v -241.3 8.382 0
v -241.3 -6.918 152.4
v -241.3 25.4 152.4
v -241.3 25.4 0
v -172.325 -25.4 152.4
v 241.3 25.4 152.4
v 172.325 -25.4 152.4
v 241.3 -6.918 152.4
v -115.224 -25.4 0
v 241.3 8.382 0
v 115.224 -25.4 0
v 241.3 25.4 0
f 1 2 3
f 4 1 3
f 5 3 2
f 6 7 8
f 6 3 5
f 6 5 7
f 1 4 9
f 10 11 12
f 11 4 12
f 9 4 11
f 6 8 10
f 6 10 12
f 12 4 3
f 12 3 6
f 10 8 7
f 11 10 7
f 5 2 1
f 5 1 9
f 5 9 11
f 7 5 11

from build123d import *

# Parameters (mm, degrees)
F0_W     = 482.6
F0_H     = 50.8
F1_DEPTH = 152.4


# Not quite as in the source:
# - a pattern or mirror of a feature is missing from the dataset's text; its kind, count and spacing are read off the source's solid


with BuildPart() as f1:
    # F0 (on Top) → F1 (new body)
    with BuildSketch(Plane.XY):
        Rectangle(F0_W, F0_H)
    extrude(amount=F1_DEPTH)

    # F4: sweep along a path in F3
    with BuildLine(Plane(origin=(-241.3, 0, 0), x_dir=(0, -1, 0), z_dir=(-1, 0, 0))) as f4_path:
        Line((15.9376427472, 242.2395817821), (-8.382, 0))
    # F2 (on face) → F4 (sweep, cut)
    with BuildSketch(Plane(origin=(0, 0, 0), x_dir=(1, 0, 0), z_dir=(0, 0, -1))):
        Polygon((-241.3, 25.4), (-241.3, -8.382), (-115.2238596187, 25.4), align=None)
    f4 = sweep(path=f4_path.line, mode=Mode.SUBTRACT)

    # F4_copies: F4 across plane
    add(f4.mirror(Plane(origin=(0, 0, 0), x_dir=(0, 0, 1), z_dir=(1, 0, 0))), mode=Mode.SUBTRACT)


solid = f1.part
